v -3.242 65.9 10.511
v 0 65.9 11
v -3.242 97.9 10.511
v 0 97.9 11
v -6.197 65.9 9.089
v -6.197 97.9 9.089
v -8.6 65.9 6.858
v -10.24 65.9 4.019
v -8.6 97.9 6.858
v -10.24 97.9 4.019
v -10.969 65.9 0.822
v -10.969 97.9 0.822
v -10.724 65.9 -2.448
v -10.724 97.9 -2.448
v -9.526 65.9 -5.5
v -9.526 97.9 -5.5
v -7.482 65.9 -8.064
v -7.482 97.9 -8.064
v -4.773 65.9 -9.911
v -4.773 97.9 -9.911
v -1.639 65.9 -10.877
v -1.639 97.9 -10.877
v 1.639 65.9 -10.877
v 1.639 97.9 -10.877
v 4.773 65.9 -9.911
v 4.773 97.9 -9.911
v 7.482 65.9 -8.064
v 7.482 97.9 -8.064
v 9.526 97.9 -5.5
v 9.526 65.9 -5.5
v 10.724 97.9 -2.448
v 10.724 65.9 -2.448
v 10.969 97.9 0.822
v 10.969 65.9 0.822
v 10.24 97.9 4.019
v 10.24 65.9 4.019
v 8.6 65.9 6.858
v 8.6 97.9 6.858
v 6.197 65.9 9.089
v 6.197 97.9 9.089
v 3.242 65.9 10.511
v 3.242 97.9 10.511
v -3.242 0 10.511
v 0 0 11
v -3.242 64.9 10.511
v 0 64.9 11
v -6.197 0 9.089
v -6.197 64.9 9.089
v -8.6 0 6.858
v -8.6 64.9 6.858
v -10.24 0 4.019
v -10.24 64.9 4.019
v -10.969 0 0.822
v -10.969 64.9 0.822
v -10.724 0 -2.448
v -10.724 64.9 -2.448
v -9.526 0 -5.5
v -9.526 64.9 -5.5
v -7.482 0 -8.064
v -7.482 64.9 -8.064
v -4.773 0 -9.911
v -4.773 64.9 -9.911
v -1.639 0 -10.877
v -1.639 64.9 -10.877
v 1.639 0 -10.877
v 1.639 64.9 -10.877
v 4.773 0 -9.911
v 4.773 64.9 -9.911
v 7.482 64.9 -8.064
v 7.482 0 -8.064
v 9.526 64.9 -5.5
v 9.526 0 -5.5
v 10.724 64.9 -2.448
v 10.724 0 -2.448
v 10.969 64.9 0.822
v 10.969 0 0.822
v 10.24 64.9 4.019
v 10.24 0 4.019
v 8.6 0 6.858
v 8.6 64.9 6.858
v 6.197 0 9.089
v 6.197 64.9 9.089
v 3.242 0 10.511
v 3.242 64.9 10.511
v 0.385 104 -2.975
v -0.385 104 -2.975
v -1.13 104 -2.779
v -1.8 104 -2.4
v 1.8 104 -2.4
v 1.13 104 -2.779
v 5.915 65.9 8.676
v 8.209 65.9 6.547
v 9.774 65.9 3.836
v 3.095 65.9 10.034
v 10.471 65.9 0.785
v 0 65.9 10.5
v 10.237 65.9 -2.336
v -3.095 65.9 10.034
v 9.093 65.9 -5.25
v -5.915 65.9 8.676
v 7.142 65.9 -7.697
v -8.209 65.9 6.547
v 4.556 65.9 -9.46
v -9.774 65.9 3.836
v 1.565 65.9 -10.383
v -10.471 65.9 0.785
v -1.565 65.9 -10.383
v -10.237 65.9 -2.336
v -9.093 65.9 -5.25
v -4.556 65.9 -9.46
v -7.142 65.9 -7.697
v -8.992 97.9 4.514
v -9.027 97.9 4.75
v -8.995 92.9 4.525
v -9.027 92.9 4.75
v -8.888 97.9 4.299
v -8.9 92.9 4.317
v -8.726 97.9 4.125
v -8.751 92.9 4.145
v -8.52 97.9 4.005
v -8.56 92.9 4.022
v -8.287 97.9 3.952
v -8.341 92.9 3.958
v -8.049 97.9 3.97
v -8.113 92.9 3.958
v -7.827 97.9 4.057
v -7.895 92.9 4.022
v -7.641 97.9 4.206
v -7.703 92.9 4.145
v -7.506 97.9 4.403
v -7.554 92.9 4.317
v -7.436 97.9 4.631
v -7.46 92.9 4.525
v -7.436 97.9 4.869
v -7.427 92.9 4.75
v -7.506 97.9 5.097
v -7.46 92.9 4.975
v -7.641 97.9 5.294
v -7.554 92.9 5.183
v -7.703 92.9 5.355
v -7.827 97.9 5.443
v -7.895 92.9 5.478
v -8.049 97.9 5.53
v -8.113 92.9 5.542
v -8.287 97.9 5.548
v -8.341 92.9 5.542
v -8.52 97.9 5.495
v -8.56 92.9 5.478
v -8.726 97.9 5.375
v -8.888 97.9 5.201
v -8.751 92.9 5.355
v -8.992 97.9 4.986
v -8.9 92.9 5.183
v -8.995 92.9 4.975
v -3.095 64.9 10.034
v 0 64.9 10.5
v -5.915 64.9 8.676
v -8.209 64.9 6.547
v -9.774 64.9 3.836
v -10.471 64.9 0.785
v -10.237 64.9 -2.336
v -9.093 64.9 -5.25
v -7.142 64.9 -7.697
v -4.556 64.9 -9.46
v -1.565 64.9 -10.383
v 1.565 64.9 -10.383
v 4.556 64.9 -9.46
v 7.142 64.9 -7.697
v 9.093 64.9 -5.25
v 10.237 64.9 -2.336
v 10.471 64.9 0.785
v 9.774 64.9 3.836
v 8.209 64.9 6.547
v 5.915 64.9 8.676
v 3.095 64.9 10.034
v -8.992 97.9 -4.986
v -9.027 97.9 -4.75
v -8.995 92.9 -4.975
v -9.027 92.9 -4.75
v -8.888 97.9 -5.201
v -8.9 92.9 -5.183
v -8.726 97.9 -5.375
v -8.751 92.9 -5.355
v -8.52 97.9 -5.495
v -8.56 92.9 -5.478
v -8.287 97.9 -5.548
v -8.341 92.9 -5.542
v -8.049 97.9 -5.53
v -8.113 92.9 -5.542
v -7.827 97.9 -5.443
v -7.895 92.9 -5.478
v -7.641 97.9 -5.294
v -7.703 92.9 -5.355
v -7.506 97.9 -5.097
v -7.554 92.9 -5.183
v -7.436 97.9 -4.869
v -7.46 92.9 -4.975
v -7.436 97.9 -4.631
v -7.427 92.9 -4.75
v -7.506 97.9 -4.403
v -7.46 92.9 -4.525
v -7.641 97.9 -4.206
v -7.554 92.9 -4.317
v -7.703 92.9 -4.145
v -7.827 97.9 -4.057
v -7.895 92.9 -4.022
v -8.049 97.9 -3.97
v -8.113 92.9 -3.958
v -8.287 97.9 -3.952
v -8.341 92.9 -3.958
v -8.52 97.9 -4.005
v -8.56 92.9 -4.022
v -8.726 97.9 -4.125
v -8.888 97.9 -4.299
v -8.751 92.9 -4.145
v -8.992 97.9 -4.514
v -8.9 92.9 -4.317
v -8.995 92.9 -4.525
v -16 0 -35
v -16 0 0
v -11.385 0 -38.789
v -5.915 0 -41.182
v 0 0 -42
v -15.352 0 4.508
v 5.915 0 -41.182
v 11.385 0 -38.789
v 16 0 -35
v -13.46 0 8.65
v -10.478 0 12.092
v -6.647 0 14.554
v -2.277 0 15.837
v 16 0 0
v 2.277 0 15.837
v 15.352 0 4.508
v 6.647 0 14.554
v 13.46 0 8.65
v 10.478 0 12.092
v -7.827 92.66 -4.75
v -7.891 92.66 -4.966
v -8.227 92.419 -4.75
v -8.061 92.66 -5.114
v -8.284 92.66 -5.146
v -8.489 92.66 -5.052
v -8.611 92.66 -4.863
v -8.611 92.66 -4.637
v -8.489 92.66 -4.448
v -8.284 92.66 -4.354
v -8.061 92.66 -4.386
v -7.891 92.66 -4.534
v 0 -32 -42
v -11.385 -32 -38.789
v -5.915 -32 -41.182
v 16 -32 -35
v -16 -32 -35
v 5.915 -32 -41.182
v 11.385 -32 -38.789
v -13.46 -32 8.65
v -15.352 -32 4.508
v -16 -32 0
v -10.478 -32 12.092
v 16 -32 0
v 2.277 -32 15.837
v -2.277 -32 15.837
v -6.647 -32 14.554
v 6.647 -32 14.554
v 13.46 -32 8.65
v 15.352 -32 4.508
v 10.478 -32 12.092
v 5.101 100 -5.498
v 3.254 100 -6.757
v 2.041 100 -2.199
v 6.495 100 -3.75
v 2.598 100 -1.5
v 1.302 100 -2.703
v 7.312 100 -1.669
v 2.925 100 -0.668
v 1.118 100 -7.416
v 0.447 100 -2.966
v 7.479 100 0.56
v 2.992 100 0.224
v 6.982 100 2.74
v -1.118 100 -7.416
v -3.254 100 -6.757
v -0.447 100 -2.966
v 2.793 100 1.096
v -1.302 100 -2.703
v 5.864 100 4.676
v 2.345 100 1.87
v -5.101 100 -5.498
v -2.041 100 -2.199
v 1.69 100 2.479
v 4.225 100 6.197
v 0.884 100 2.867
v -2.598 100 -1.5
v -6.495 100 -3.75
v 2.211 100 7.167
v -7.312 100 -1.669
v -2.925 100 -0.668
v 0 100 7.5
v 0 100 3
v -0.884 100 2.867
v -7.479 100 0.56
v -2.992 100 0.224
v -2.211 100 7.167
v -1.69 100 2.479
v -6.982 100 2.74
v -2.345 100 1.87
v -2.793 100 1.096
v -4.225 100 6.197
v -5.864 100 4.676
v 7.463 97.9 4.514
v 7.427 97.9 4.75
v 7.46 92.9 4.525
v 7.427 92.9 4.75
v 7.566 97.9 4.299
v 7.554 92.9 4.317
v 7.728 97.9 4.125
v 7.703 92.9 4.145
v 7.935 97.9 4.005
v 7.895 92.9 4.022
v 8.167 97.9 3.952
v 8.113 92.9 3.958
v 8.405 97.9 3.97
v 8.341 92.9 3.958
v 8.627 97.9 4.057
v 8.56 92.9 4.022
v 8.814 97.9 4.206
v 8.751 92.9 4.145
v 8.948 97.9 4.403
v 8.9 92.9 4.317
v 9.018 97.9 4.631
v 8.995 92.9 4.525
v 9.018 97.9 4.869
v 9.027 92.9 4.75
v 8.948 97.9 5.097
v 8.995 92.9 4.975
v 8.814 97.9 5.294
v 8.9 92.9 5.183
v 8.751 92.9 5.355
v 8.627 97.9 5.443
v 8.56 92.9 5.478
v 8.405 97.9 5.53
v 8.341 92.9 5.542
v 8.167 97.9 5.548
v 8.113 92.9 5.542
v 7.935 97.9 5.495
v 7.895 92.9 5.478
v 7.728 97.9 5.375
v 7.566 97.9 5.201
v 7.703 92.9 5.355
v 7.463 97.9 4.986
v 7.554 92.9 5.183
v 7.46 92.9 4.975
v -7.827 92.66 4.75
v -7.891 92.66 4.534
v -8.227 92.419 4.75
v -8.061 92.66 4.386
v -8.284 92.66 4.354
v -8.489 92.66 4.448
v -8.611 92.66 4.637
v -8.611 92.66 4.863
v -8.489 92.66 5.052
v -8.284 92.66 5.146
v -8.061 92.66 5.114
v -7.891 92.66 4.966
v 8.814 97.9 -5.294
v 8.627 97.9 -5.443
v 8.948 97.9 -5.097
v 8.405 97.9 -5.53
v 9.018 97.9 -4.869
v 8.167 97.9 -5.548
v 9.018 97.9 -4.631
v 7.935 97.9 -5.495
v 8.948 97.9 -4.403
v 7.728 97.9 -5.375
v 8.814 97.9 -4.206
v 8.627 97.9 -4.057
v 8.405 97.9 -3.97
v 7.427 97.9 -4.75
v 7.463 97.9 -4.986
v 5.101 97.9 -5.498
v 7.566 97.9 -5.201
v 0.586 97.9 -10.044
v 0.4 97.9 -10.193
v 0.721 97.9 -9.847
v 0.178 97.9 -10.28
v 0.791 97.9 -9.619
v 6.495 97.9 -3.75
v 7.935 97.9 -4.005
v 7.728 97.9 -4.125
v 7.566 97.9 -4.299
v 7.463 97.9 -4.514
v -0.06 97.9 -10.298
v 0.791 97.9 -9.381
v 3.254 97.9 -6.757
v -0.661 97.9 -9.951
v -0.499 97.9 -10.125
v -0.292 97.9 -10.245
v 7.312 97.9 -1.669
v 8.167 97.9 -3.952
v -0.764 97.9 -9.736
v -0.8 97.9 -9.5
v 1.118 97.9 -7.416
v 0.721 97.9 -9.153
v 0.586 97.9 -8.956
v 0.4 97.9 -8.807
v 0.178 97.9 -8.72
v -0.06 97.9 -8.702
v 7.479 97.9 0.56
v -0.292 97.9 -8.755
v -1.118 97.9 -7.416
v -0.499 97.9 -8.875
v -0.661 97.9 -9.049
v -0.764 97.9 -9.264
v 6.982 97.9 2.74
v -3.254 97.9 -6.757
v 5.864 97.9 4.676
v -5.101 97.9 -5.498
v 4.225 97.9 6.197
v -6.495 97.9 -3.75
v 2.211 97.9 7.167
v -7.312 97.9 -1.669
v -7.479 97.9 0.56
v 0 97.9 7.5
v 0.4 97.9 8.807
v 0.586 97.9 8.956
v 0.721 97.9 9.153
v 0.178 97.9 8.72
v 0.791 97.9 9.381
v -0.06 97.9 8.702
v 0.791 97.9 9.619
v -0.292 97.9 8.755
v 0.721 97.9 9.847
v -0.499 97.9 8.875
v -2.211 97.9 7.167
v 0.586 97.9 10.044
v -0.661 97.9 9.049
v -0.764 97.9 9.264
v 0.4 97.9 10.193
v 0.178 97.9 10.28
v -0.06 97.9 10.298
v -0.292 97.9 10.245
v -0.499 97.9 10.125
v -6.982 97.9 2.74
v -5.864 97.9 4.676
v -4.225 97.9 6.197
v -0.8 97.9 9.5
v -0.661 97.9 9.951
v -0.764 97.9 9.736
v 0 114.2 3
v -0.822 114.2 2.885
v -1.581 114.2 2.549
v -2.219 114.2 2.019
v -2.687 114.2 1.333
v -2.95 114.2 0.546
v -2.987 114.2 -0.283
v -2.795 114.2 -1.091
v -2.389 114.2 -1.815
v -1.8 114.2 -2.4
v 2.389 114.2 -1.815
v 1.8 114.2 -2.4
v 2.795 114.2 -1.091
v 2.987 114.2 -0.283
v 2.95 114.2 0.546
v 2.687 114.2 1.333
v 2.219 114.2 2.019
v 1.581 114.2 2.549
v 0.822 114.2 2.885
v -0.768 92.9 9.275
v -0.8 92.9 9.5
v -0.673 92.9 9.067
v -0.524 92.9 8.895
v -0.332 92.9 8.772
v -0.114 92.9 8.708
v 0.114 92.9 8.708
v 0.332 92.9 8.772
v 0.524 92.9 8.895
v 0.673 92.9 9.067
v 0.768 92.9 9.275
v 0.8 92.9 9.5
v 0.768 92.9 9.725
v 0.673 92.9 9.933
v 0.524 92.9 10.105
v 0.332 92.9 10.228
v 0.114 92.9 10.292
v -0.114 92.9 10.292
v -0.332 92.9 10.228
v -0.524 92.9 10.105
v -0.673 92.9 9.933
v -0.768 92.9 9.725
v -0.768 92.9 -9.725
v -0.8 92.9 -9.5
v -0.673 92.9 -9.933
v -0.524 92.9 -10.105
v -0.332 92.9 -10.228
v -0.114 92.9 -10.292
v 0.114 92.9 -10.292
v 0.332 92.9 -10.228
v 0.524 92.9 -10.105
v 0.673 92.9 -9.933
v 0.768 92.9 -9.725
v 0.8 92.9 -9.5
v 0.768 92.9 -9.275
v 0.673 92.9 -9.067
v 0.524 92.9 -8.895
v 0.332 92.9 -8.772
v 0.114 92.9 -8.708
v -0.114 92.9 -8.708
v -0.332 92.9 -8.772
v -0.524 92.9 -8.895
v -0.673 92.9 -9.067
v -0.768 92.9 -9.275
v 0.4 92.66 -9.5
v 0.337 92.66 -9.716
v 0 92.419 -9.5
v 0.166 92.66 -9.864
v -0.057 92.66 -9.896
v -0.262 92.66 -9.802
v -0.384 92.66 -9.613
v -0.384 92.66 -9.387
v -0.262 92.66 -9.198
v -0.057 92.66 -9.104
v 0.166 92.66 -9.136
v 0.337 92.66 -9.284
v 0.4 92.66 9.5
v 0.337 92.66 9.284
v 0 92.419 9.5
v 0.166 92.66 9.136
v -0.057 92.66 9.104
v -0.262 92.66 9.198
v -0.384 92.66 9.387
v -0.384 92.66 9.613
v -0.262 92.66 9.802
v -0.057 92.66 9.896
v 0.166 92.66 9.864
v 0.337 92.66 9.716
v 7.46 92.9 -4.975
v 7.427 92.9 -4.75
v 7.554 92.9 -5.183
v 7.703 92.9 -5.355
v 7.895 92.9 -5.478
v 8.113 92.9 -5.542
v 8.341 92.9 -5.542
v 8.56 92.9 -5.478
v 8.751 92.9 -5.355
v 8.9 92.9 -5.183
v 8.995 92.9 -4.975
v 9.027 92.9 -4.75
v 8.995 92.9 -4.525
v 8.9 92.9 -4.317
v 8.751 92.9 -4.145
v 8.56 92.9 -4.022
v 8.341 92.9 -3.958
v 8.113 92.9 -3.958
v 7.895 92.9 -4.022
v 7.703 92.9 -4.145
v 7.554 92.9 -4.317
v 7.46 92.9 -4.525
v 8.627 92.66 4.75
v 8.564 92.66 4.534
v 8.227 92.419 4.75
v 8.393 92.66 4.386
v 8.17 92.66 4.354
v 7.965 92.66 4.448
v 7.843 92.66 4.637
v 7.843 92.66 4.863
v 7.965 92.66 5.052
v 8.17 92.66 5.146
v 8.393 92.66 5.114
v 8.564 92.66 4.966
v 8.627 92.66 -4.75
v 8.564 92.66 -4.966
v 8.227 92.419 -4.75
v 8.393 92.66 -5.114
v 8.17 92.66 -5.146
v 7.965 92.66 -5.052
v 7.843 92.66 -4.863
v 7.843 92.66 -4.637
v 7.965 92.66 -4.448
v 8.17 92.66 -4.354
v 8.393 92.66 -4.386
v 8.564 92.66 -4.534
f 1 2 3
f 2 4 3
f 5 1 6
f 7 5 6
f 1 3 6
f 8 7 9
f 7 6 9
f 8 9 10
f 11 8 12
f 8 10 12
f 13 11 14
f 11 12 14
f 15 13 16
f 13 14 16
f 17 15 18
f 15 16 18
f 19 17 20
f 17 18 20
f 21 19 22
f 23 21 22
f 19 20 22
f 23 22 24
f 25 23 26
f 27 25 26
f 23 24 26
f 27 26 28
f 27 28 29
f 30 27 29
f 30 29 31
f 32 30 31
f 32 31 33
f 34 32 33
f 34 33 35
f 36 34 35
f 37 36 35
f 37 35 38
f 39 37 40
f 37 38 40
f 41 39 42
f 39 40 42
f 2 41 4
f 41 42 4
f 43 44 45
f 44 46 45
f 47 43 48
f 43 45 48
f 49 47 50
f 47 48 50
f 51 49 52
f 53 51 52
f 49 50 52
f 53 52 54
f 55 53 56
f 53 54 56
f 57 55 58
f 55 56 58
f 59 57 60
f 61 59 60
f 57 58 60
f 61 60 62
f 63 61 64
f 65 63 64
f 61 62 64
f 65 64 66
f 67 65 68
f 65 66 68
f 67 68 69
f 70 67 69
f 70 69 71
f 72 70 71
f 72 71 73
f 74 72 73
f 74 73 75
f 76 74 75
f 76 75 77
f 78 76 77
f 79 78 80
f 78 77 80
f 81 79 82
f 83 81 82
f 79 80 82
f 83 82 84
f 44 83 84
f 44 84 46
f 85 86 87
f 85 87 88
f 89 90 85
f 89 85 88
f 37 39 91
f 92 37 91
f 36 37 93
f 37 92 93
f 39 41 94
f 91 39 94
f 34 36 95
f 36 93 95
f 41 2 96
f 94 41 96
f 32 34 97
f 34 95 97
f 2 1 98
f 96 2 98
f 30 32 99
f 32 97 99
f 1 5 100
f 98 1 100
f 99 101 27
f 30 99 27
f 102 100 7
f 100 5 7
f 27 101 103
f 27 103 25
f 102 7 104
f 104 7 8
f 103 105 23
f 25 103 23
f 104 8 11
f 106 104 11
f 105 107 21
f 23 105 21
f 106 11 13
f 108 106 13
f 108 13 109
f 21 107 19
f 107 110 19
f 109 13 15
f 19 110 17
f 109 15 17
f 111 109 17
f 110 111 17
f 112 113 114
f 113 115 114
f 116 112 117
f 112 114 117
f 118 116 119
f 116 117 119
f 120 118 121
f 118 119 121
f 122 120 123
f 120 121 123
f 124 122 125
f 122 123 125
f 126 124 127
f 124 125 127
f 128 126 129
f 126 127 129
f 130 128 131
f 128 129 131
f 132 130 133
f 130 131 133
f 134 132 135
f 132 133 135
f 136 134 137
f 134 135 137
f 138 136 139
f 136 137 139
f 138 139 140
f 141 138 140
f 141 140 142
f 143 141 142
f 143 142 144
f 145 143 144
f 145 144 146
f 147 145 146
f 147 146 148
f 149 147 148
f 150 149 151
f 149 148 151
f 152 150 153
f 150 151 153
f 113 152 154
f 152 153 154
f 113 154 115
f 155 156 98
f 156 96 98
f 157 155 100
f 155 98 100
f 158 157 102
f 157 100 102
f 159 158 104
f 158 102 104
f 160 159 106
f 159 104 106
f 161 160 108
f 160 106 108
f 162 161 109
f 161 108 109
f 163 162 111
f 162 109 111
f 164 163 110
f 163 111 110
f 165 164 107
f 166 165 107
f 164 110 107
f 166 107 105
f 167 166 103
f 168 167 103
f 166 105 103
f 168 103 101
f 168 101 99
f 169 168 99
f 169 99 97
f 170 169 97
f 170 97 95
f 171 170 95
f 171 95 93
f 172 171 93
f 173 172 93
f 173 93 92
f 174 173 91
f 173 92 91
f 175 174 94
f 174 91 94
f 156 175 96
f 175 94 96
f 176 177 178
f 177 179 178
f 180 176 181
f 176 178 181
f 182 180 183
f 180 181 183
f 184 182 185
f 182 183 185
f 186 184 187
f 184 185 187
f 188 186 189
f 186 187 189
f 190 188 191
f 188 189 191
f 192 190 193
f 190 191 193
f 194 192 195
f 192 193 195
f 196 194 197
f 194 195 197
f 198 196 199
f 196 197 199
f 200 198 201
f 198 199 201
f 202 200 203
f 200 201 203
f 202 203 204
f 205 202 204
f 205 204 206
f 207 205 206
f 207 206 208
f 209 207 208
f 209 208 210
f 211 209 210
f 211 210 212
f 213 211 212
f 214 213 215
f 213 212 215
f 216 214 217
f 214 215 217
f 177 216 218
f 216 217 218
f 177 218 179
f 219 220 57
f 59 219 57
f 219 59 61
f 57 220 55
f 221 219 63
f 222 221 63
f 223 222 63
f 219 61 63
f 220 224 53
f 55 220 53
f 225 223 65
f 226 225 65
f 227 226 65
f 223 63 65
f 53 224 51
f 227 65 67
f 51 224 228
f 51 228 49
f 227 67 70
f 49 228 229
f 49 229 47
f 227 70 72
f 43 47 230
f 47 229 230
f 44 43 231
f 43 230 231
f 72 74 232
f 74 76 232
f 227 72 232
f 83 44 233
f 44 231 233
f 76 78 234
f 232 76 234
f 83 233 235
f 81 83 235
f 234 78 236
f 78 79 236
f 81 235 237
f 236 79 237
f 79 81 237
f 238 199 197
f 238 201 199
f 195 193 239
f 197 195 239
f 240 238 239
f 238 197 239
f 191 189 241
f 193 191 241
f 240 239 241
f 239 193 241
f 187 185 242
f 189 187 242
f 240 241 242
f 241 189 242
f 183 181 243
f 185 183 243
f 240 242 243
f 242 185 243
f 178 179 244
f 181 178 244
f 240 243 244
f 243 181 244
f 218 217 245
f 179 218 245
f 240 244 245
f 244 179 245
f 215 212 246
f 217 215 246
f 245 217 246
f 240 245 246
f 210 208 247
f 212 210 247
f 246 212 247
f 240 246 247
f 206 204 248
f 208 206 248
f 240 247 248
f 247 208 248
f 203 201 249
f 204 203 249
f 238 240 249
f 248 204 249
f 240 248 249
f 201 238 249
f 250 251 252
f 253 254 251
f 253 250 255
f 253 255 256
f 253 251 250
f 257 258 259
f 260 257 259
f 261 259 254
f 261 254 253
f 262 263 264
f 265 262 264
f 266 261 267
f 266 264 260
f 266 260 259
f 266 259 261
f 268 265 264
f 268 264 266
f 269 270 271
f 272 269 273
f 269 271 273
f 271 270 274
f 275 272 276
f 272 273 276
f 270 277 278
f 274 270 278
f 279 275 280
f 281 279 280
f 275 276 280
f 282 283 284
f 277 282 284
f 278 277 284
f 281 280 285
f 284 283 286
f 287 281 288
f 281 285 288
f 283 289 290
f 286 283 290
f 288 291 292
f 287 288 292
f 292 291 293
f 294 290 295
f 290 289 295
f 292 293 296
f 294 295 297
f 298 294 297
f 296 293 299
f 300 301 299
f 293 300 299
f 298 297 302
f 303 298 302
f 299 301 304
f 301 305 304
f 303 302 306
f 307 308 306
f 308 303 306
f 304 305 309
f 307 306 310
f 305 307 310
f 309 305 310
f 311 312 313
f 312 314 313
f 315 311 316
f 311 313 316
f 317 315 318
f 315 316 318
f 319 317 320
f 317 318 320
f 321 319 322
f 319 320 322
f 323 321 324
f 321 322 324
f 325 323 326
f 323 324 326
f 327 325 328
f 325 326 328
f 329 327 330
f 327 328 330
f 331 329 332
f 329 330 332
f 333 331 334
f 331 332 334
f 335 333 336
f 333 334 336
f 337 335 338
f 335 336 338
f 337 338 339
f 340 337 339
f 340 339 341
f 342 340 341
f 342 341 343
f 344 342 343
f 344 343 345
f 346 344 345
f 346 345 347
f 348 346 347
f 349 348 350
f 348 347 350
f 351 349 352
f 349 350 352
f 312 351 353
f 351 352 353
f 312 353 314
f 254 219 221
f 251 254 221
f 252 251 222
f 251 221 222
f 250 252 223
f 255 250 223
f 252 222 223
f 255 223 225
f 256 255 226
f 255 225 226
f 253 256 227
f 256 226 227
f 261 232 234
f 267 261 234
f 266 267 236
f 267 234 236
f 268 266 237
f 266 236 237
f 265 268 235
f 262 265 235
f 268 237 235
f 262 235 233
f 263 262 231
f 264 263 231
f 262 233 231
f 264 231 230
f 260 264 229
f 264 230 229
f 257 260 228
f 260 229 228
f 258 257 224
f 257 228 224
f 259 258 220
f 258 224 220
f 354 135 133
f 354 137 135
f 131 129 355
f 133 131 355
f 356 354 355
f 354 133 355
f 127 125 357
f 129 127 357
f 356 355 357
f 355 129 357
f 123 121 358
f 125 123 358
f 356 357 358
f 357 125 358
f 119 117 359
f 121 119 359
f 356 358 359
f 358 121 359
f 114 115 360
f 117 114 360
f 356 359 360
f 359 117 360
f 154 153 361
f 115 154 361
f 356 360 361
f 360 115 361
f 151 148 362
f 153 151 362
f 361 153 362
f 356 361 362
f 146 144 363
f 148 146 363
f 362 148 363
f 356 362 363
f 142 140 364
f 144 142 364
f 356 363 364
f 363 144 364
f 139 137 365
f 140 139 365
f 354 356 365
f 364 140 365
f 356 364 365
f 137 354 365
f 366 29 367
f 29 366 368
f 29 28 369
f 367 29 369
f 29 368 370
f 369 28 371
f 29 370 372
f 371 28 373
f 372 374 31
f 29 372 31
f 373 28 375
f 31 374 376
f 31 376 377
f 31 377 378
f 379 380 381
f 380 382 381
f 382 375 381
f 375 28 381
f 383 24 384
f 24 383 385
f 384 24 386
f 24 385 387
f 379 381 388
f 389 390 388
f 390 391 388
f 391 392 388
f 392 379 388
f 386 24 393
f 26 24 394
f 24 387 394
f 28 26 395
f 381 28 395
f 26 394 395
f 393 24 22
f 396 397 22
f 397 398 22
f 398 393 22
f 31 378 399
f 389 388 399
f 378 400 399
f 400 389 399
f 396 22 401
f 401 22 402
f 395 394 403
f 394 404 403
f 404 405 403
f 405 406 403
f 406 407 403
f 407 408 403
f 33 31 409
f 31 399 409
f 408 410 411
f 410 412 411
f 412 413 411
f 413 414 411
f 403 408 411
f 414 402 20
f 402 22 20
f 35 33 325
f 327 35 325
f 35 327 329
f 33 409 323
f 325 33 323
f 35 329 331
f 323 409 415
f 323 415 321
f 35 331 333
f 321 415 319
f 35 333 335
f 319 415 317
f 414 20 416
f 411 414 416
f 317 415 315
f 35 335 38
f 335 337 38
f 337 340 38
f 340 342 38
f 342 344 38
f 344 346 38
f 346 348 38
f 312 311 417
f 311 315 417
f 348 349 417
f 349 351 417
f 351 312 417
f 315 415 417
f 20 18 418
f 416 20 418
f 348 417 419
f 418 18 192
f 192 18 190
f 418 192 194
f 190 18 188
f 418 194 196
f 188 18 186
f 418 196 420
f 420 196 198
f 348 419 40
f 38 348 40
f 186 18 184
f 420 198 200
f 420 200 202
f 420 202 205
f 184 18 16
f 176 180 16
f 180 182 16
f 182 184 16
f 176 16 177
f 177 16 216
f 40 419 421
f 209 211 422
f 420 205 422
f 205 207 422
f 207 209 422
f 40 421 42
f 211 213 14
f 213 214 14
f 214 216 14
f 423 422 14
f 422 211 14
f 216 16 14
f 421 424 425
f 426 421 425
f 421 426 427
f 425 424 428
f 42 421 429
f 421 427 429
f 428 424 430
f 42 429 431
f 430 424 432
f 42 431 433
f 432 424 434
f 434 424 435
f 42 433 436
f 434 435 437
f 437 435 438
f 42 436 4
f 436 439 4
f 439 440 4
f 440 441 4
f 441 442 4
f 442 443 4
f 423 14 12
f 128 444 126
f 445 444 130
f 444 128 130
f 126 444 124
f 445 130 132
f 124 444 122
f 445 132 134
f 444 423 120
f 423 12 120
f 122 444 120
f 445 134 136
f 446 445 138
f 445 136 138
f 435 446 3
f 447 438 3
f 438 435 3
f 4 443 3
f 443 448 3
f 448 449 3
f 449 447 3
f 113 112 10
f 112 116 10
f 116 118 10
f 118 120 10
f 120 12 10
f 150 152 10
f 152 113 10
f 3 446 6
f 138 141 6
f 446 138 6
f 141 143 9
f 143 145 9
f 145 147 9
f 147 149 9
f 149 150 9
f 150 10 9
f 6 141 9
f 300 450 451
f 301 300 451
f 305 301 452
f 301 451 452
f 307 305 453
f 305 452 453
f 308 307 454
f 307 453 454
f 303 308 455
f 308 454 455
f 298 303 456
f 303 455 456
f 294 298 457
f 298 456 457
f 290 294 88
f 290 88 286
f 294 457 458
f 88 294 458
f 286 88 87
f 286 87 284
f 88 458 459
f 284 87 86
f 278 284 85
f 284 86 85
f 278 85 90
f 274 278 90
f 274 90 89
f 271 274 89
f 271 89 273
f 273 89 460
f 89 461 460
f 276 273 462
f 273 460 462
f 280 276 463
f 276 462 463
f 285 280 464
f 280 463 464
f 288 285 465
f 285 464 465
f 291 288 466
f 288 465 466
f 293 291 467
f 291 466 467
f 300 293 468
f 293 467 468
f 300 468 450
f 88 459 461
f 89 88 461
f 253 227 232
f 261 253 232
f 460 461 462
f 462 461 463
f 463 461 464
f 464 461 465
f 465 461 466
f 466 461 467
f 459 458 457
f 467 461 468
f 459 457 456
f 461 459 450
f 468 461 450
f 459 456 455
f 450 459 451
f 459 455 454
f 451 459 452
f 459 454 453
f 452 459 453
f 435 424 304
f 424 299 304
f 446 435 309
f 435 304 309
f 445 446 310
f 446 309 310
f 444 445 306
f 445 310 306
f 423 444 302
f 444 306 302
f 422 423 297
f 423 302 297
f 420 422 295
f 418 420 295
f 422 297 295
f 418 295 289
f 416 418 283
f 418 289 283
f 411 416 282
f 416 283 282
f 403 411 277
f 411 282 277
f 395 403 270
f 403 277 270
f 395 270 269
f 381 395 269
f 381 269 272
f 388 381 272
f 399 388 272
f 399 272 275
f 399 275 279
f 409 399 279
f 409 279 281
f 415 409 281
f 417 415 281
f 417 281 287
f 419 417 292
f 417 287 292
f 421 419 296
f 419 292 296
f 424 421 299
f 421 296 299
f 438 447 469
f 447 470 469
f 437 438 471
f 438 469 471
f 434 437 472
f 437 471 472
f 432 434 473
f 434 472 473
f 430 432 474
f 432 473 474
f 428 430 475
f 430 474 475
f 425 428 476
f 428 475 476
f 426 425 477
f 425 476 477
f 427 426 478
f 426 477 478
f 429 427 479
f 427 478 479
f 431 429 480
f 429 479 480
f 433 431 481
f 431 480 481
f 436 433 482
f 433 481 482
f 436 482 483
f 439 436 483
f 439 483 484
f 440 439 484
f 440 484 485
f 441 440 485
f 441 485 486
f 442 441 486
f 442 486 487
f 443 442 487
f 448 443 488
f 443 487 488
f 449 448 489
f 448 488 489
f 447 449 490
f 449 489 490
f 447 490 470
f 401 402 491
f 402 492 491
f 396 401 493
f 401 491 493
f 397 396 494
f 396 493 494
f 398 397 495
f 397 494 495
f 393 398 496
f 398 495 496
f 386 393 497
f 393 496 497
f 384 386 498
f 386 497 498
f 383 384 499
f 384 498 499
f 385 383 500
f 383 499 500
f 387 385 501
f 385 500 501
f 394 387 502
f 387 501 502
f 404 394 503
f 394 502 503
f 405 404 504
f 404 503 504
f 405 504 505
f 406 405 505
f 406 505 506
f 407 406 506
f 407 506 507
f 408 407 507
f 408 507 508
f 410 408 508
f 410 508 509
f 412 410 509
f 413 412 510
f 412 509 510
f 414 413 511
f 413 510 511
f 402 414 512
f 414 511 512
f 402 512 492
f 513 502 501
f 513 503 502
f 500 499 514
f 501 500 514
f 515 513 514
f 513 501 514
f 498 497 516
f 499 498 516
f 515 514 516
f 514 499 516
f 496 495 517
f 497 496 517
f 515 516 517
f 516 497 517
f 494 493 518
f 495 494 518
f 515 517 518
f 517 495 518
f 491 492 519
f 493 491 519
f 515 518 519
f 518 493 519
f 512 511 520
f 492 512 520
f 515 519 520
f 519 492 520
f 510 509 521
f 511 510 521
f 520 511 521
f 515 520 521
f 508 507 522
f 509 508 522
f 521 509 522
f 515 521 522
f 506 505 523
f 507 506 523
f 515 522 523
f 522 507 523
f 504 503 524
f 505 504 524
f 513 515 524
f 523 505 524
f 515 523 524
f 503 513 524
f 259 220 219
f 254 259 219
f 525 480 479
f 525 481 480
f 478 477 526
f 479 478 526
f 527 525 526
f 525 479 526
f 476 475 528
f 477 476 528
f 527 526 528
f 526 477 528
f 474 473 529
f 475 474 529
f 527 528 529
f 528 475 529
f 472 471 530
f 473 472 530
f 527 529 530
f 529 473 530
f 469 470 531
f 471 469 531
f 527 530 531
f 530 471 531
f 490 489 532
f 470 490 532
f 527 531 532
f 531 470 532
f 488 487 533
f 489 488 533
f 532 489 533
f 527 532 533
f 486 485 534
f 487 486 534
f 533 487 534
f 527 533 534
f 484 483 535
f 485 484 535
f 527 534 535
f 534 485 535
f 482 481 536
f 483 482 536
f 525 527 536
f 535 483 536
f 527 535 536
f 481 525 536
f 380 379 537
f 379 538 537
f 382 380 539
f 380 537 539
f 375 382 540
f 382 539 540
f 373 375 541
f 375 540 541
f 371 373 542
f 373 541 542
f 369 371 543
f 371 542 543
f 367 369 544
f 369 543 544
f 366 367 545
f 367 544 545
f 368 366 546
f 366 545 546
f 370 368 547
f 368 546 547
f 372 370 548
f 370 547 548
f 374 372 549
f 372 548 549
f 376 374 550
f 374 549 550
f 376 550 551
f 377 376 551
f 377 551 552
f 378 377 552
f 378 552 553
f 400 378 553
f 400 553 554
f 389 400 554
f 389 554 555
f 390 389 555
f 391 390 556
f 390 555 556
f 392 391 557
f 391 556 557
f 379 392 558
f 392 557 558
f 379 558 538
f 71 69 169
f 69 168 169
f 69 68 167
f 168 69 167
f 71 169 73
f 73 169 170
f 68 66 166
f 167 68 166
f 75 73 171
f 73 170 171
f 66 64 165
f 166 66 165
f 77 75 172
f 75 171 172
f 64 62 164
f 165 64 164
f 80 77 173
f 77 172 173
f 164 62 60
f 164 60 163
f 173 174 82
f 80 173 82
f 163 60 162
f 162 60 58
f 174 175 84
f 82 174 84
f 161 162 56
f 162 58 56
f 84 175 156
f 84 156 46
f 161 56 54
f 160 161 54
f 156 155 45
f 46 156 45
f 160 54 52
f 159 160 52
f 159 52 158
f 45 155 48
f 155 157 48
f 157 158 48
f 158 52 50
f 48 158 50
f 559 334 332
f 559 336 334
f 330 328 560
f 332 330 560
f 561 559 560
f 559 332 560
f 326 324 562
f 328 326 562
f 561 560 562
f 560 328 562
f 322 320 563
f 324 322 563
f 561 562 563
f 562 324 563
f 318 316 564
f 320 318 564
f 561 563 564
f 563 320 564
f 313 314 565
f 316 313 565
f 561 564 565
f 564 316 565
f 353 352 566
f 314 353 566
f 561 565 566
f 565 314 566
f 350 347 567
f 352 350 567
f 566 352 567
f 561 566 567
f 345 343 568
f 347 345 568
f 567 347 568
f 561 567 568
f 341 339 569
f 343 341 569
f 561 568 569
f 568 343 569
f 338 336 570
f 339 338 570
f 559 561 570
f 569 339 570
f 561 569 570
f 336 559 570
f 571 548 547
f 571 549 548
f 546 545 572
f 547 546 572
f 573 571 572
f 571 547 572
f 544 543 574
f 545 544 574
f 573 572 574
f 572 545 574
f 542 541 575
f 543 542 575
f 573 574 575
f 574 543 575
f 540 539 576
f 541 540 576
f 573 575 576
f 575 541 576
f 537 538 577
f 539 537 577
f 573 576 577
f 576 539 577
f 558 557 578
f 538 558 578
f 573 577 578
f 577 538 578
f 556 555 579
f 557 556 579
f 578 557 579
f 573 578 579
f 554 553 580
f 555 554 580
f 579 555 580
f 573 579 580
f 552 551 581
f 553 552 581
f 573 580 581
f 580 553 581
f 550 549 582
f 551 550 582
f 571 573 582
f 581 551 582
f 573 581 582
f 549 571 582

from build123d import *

# Parameters (mm, degrees)
CUT_EXTRUDE_1_DEPTH    = 10.2
EXTRUDE_1_DEPTH        = 32
HOLE_WIZARD_M2_1_D     = 1.6
HOLE_WIZARD_M2_1_DEPTH = 5
HOLE_WIZARD_M2_1_TIP   = 0.480688495


with BuildPart() as part:
    # 草图1 → 旋转1 (revolve)
    with BuildSketch(Plane.XY, mode=Mode.PRIVATE) as revolve_1_sk:
        Polygon((0, 0), (11, 0), (11, 64.9), (10.5, 64.9), (10.5, 65.9), (11, 65.9), (11, 97.9), (7.5, 97.9), (7.5, 100), (3, 100), (3, 114.2), (0, 114.2), align=None)
    revolve(revolve_1_sk.sketch.rotate(Axis((0, 60.650671984, 0), (0, -1, 0)), 90), axis=Axis((0, 60.650671984, 0), (0, -1, 0)))

    # 草图2 → 切除-拉伸1 (cut)
    with BuildSketch(Plane(origin=(0, 114.2, 0), x_dir=(1, 0, 0), z_dir=(0, 1, 0))):
        Polygon((-48.862110032, 2.4), (-1.8, 2.4), (1.8, 2.4), (48.862110032, 2.4), (48.862110032, 96.524220063), (-48.862110032, 96.524220063), align=None)
    extrude(amount=-CUT_EXTRUDE_1_DEPTH, mode=Mode.SUBTRACT)

    # 草图3 → 凸台-拉伸1 (add)
    with BuildSketch(Plane.XZ):
        with BuildLine():
            Line((-16, 0), (-16, -35))
            ThreePointArc((-16, -35), (0, -42), (16, -35))
            Line((16, -35), (16, 0))
            ThreePointArc((16, 0), (0, 16), (-16, 0))
        make_face()
    extrude(amount=EXTRUDE_1_DEPTH)

    # M2 螺纹孔1
    with Locations(Plane(origin=(0, 97.9, 0), x_dir=(1, 0, 0), z_dir=(0, 1, 0))):
        with Locations((0, 9.5), (-8.227241336, 4.75), (-8.227241336, -4.75), (0, -9.5), (8.227241336, -4.75), (8.227241336, 4.75)):
            Hole(HOLE_WIZARD_M2_1_D / 2, depth=HOLE_WIZARD_M2_1_DEPTH)
            with Locations((0, 0, -(HOLE_WIZARD_M2_1_DEPTH + HOLE_WIZARD_M2_1_TIP / 2))):  # 118° drill point
                Cone(0, HOLE_WIZARD_M2_1_D / 2, HOLE_WIZARD_M2_1_TIP, mode=Mode.SUBTRACT)


solid = part.part
